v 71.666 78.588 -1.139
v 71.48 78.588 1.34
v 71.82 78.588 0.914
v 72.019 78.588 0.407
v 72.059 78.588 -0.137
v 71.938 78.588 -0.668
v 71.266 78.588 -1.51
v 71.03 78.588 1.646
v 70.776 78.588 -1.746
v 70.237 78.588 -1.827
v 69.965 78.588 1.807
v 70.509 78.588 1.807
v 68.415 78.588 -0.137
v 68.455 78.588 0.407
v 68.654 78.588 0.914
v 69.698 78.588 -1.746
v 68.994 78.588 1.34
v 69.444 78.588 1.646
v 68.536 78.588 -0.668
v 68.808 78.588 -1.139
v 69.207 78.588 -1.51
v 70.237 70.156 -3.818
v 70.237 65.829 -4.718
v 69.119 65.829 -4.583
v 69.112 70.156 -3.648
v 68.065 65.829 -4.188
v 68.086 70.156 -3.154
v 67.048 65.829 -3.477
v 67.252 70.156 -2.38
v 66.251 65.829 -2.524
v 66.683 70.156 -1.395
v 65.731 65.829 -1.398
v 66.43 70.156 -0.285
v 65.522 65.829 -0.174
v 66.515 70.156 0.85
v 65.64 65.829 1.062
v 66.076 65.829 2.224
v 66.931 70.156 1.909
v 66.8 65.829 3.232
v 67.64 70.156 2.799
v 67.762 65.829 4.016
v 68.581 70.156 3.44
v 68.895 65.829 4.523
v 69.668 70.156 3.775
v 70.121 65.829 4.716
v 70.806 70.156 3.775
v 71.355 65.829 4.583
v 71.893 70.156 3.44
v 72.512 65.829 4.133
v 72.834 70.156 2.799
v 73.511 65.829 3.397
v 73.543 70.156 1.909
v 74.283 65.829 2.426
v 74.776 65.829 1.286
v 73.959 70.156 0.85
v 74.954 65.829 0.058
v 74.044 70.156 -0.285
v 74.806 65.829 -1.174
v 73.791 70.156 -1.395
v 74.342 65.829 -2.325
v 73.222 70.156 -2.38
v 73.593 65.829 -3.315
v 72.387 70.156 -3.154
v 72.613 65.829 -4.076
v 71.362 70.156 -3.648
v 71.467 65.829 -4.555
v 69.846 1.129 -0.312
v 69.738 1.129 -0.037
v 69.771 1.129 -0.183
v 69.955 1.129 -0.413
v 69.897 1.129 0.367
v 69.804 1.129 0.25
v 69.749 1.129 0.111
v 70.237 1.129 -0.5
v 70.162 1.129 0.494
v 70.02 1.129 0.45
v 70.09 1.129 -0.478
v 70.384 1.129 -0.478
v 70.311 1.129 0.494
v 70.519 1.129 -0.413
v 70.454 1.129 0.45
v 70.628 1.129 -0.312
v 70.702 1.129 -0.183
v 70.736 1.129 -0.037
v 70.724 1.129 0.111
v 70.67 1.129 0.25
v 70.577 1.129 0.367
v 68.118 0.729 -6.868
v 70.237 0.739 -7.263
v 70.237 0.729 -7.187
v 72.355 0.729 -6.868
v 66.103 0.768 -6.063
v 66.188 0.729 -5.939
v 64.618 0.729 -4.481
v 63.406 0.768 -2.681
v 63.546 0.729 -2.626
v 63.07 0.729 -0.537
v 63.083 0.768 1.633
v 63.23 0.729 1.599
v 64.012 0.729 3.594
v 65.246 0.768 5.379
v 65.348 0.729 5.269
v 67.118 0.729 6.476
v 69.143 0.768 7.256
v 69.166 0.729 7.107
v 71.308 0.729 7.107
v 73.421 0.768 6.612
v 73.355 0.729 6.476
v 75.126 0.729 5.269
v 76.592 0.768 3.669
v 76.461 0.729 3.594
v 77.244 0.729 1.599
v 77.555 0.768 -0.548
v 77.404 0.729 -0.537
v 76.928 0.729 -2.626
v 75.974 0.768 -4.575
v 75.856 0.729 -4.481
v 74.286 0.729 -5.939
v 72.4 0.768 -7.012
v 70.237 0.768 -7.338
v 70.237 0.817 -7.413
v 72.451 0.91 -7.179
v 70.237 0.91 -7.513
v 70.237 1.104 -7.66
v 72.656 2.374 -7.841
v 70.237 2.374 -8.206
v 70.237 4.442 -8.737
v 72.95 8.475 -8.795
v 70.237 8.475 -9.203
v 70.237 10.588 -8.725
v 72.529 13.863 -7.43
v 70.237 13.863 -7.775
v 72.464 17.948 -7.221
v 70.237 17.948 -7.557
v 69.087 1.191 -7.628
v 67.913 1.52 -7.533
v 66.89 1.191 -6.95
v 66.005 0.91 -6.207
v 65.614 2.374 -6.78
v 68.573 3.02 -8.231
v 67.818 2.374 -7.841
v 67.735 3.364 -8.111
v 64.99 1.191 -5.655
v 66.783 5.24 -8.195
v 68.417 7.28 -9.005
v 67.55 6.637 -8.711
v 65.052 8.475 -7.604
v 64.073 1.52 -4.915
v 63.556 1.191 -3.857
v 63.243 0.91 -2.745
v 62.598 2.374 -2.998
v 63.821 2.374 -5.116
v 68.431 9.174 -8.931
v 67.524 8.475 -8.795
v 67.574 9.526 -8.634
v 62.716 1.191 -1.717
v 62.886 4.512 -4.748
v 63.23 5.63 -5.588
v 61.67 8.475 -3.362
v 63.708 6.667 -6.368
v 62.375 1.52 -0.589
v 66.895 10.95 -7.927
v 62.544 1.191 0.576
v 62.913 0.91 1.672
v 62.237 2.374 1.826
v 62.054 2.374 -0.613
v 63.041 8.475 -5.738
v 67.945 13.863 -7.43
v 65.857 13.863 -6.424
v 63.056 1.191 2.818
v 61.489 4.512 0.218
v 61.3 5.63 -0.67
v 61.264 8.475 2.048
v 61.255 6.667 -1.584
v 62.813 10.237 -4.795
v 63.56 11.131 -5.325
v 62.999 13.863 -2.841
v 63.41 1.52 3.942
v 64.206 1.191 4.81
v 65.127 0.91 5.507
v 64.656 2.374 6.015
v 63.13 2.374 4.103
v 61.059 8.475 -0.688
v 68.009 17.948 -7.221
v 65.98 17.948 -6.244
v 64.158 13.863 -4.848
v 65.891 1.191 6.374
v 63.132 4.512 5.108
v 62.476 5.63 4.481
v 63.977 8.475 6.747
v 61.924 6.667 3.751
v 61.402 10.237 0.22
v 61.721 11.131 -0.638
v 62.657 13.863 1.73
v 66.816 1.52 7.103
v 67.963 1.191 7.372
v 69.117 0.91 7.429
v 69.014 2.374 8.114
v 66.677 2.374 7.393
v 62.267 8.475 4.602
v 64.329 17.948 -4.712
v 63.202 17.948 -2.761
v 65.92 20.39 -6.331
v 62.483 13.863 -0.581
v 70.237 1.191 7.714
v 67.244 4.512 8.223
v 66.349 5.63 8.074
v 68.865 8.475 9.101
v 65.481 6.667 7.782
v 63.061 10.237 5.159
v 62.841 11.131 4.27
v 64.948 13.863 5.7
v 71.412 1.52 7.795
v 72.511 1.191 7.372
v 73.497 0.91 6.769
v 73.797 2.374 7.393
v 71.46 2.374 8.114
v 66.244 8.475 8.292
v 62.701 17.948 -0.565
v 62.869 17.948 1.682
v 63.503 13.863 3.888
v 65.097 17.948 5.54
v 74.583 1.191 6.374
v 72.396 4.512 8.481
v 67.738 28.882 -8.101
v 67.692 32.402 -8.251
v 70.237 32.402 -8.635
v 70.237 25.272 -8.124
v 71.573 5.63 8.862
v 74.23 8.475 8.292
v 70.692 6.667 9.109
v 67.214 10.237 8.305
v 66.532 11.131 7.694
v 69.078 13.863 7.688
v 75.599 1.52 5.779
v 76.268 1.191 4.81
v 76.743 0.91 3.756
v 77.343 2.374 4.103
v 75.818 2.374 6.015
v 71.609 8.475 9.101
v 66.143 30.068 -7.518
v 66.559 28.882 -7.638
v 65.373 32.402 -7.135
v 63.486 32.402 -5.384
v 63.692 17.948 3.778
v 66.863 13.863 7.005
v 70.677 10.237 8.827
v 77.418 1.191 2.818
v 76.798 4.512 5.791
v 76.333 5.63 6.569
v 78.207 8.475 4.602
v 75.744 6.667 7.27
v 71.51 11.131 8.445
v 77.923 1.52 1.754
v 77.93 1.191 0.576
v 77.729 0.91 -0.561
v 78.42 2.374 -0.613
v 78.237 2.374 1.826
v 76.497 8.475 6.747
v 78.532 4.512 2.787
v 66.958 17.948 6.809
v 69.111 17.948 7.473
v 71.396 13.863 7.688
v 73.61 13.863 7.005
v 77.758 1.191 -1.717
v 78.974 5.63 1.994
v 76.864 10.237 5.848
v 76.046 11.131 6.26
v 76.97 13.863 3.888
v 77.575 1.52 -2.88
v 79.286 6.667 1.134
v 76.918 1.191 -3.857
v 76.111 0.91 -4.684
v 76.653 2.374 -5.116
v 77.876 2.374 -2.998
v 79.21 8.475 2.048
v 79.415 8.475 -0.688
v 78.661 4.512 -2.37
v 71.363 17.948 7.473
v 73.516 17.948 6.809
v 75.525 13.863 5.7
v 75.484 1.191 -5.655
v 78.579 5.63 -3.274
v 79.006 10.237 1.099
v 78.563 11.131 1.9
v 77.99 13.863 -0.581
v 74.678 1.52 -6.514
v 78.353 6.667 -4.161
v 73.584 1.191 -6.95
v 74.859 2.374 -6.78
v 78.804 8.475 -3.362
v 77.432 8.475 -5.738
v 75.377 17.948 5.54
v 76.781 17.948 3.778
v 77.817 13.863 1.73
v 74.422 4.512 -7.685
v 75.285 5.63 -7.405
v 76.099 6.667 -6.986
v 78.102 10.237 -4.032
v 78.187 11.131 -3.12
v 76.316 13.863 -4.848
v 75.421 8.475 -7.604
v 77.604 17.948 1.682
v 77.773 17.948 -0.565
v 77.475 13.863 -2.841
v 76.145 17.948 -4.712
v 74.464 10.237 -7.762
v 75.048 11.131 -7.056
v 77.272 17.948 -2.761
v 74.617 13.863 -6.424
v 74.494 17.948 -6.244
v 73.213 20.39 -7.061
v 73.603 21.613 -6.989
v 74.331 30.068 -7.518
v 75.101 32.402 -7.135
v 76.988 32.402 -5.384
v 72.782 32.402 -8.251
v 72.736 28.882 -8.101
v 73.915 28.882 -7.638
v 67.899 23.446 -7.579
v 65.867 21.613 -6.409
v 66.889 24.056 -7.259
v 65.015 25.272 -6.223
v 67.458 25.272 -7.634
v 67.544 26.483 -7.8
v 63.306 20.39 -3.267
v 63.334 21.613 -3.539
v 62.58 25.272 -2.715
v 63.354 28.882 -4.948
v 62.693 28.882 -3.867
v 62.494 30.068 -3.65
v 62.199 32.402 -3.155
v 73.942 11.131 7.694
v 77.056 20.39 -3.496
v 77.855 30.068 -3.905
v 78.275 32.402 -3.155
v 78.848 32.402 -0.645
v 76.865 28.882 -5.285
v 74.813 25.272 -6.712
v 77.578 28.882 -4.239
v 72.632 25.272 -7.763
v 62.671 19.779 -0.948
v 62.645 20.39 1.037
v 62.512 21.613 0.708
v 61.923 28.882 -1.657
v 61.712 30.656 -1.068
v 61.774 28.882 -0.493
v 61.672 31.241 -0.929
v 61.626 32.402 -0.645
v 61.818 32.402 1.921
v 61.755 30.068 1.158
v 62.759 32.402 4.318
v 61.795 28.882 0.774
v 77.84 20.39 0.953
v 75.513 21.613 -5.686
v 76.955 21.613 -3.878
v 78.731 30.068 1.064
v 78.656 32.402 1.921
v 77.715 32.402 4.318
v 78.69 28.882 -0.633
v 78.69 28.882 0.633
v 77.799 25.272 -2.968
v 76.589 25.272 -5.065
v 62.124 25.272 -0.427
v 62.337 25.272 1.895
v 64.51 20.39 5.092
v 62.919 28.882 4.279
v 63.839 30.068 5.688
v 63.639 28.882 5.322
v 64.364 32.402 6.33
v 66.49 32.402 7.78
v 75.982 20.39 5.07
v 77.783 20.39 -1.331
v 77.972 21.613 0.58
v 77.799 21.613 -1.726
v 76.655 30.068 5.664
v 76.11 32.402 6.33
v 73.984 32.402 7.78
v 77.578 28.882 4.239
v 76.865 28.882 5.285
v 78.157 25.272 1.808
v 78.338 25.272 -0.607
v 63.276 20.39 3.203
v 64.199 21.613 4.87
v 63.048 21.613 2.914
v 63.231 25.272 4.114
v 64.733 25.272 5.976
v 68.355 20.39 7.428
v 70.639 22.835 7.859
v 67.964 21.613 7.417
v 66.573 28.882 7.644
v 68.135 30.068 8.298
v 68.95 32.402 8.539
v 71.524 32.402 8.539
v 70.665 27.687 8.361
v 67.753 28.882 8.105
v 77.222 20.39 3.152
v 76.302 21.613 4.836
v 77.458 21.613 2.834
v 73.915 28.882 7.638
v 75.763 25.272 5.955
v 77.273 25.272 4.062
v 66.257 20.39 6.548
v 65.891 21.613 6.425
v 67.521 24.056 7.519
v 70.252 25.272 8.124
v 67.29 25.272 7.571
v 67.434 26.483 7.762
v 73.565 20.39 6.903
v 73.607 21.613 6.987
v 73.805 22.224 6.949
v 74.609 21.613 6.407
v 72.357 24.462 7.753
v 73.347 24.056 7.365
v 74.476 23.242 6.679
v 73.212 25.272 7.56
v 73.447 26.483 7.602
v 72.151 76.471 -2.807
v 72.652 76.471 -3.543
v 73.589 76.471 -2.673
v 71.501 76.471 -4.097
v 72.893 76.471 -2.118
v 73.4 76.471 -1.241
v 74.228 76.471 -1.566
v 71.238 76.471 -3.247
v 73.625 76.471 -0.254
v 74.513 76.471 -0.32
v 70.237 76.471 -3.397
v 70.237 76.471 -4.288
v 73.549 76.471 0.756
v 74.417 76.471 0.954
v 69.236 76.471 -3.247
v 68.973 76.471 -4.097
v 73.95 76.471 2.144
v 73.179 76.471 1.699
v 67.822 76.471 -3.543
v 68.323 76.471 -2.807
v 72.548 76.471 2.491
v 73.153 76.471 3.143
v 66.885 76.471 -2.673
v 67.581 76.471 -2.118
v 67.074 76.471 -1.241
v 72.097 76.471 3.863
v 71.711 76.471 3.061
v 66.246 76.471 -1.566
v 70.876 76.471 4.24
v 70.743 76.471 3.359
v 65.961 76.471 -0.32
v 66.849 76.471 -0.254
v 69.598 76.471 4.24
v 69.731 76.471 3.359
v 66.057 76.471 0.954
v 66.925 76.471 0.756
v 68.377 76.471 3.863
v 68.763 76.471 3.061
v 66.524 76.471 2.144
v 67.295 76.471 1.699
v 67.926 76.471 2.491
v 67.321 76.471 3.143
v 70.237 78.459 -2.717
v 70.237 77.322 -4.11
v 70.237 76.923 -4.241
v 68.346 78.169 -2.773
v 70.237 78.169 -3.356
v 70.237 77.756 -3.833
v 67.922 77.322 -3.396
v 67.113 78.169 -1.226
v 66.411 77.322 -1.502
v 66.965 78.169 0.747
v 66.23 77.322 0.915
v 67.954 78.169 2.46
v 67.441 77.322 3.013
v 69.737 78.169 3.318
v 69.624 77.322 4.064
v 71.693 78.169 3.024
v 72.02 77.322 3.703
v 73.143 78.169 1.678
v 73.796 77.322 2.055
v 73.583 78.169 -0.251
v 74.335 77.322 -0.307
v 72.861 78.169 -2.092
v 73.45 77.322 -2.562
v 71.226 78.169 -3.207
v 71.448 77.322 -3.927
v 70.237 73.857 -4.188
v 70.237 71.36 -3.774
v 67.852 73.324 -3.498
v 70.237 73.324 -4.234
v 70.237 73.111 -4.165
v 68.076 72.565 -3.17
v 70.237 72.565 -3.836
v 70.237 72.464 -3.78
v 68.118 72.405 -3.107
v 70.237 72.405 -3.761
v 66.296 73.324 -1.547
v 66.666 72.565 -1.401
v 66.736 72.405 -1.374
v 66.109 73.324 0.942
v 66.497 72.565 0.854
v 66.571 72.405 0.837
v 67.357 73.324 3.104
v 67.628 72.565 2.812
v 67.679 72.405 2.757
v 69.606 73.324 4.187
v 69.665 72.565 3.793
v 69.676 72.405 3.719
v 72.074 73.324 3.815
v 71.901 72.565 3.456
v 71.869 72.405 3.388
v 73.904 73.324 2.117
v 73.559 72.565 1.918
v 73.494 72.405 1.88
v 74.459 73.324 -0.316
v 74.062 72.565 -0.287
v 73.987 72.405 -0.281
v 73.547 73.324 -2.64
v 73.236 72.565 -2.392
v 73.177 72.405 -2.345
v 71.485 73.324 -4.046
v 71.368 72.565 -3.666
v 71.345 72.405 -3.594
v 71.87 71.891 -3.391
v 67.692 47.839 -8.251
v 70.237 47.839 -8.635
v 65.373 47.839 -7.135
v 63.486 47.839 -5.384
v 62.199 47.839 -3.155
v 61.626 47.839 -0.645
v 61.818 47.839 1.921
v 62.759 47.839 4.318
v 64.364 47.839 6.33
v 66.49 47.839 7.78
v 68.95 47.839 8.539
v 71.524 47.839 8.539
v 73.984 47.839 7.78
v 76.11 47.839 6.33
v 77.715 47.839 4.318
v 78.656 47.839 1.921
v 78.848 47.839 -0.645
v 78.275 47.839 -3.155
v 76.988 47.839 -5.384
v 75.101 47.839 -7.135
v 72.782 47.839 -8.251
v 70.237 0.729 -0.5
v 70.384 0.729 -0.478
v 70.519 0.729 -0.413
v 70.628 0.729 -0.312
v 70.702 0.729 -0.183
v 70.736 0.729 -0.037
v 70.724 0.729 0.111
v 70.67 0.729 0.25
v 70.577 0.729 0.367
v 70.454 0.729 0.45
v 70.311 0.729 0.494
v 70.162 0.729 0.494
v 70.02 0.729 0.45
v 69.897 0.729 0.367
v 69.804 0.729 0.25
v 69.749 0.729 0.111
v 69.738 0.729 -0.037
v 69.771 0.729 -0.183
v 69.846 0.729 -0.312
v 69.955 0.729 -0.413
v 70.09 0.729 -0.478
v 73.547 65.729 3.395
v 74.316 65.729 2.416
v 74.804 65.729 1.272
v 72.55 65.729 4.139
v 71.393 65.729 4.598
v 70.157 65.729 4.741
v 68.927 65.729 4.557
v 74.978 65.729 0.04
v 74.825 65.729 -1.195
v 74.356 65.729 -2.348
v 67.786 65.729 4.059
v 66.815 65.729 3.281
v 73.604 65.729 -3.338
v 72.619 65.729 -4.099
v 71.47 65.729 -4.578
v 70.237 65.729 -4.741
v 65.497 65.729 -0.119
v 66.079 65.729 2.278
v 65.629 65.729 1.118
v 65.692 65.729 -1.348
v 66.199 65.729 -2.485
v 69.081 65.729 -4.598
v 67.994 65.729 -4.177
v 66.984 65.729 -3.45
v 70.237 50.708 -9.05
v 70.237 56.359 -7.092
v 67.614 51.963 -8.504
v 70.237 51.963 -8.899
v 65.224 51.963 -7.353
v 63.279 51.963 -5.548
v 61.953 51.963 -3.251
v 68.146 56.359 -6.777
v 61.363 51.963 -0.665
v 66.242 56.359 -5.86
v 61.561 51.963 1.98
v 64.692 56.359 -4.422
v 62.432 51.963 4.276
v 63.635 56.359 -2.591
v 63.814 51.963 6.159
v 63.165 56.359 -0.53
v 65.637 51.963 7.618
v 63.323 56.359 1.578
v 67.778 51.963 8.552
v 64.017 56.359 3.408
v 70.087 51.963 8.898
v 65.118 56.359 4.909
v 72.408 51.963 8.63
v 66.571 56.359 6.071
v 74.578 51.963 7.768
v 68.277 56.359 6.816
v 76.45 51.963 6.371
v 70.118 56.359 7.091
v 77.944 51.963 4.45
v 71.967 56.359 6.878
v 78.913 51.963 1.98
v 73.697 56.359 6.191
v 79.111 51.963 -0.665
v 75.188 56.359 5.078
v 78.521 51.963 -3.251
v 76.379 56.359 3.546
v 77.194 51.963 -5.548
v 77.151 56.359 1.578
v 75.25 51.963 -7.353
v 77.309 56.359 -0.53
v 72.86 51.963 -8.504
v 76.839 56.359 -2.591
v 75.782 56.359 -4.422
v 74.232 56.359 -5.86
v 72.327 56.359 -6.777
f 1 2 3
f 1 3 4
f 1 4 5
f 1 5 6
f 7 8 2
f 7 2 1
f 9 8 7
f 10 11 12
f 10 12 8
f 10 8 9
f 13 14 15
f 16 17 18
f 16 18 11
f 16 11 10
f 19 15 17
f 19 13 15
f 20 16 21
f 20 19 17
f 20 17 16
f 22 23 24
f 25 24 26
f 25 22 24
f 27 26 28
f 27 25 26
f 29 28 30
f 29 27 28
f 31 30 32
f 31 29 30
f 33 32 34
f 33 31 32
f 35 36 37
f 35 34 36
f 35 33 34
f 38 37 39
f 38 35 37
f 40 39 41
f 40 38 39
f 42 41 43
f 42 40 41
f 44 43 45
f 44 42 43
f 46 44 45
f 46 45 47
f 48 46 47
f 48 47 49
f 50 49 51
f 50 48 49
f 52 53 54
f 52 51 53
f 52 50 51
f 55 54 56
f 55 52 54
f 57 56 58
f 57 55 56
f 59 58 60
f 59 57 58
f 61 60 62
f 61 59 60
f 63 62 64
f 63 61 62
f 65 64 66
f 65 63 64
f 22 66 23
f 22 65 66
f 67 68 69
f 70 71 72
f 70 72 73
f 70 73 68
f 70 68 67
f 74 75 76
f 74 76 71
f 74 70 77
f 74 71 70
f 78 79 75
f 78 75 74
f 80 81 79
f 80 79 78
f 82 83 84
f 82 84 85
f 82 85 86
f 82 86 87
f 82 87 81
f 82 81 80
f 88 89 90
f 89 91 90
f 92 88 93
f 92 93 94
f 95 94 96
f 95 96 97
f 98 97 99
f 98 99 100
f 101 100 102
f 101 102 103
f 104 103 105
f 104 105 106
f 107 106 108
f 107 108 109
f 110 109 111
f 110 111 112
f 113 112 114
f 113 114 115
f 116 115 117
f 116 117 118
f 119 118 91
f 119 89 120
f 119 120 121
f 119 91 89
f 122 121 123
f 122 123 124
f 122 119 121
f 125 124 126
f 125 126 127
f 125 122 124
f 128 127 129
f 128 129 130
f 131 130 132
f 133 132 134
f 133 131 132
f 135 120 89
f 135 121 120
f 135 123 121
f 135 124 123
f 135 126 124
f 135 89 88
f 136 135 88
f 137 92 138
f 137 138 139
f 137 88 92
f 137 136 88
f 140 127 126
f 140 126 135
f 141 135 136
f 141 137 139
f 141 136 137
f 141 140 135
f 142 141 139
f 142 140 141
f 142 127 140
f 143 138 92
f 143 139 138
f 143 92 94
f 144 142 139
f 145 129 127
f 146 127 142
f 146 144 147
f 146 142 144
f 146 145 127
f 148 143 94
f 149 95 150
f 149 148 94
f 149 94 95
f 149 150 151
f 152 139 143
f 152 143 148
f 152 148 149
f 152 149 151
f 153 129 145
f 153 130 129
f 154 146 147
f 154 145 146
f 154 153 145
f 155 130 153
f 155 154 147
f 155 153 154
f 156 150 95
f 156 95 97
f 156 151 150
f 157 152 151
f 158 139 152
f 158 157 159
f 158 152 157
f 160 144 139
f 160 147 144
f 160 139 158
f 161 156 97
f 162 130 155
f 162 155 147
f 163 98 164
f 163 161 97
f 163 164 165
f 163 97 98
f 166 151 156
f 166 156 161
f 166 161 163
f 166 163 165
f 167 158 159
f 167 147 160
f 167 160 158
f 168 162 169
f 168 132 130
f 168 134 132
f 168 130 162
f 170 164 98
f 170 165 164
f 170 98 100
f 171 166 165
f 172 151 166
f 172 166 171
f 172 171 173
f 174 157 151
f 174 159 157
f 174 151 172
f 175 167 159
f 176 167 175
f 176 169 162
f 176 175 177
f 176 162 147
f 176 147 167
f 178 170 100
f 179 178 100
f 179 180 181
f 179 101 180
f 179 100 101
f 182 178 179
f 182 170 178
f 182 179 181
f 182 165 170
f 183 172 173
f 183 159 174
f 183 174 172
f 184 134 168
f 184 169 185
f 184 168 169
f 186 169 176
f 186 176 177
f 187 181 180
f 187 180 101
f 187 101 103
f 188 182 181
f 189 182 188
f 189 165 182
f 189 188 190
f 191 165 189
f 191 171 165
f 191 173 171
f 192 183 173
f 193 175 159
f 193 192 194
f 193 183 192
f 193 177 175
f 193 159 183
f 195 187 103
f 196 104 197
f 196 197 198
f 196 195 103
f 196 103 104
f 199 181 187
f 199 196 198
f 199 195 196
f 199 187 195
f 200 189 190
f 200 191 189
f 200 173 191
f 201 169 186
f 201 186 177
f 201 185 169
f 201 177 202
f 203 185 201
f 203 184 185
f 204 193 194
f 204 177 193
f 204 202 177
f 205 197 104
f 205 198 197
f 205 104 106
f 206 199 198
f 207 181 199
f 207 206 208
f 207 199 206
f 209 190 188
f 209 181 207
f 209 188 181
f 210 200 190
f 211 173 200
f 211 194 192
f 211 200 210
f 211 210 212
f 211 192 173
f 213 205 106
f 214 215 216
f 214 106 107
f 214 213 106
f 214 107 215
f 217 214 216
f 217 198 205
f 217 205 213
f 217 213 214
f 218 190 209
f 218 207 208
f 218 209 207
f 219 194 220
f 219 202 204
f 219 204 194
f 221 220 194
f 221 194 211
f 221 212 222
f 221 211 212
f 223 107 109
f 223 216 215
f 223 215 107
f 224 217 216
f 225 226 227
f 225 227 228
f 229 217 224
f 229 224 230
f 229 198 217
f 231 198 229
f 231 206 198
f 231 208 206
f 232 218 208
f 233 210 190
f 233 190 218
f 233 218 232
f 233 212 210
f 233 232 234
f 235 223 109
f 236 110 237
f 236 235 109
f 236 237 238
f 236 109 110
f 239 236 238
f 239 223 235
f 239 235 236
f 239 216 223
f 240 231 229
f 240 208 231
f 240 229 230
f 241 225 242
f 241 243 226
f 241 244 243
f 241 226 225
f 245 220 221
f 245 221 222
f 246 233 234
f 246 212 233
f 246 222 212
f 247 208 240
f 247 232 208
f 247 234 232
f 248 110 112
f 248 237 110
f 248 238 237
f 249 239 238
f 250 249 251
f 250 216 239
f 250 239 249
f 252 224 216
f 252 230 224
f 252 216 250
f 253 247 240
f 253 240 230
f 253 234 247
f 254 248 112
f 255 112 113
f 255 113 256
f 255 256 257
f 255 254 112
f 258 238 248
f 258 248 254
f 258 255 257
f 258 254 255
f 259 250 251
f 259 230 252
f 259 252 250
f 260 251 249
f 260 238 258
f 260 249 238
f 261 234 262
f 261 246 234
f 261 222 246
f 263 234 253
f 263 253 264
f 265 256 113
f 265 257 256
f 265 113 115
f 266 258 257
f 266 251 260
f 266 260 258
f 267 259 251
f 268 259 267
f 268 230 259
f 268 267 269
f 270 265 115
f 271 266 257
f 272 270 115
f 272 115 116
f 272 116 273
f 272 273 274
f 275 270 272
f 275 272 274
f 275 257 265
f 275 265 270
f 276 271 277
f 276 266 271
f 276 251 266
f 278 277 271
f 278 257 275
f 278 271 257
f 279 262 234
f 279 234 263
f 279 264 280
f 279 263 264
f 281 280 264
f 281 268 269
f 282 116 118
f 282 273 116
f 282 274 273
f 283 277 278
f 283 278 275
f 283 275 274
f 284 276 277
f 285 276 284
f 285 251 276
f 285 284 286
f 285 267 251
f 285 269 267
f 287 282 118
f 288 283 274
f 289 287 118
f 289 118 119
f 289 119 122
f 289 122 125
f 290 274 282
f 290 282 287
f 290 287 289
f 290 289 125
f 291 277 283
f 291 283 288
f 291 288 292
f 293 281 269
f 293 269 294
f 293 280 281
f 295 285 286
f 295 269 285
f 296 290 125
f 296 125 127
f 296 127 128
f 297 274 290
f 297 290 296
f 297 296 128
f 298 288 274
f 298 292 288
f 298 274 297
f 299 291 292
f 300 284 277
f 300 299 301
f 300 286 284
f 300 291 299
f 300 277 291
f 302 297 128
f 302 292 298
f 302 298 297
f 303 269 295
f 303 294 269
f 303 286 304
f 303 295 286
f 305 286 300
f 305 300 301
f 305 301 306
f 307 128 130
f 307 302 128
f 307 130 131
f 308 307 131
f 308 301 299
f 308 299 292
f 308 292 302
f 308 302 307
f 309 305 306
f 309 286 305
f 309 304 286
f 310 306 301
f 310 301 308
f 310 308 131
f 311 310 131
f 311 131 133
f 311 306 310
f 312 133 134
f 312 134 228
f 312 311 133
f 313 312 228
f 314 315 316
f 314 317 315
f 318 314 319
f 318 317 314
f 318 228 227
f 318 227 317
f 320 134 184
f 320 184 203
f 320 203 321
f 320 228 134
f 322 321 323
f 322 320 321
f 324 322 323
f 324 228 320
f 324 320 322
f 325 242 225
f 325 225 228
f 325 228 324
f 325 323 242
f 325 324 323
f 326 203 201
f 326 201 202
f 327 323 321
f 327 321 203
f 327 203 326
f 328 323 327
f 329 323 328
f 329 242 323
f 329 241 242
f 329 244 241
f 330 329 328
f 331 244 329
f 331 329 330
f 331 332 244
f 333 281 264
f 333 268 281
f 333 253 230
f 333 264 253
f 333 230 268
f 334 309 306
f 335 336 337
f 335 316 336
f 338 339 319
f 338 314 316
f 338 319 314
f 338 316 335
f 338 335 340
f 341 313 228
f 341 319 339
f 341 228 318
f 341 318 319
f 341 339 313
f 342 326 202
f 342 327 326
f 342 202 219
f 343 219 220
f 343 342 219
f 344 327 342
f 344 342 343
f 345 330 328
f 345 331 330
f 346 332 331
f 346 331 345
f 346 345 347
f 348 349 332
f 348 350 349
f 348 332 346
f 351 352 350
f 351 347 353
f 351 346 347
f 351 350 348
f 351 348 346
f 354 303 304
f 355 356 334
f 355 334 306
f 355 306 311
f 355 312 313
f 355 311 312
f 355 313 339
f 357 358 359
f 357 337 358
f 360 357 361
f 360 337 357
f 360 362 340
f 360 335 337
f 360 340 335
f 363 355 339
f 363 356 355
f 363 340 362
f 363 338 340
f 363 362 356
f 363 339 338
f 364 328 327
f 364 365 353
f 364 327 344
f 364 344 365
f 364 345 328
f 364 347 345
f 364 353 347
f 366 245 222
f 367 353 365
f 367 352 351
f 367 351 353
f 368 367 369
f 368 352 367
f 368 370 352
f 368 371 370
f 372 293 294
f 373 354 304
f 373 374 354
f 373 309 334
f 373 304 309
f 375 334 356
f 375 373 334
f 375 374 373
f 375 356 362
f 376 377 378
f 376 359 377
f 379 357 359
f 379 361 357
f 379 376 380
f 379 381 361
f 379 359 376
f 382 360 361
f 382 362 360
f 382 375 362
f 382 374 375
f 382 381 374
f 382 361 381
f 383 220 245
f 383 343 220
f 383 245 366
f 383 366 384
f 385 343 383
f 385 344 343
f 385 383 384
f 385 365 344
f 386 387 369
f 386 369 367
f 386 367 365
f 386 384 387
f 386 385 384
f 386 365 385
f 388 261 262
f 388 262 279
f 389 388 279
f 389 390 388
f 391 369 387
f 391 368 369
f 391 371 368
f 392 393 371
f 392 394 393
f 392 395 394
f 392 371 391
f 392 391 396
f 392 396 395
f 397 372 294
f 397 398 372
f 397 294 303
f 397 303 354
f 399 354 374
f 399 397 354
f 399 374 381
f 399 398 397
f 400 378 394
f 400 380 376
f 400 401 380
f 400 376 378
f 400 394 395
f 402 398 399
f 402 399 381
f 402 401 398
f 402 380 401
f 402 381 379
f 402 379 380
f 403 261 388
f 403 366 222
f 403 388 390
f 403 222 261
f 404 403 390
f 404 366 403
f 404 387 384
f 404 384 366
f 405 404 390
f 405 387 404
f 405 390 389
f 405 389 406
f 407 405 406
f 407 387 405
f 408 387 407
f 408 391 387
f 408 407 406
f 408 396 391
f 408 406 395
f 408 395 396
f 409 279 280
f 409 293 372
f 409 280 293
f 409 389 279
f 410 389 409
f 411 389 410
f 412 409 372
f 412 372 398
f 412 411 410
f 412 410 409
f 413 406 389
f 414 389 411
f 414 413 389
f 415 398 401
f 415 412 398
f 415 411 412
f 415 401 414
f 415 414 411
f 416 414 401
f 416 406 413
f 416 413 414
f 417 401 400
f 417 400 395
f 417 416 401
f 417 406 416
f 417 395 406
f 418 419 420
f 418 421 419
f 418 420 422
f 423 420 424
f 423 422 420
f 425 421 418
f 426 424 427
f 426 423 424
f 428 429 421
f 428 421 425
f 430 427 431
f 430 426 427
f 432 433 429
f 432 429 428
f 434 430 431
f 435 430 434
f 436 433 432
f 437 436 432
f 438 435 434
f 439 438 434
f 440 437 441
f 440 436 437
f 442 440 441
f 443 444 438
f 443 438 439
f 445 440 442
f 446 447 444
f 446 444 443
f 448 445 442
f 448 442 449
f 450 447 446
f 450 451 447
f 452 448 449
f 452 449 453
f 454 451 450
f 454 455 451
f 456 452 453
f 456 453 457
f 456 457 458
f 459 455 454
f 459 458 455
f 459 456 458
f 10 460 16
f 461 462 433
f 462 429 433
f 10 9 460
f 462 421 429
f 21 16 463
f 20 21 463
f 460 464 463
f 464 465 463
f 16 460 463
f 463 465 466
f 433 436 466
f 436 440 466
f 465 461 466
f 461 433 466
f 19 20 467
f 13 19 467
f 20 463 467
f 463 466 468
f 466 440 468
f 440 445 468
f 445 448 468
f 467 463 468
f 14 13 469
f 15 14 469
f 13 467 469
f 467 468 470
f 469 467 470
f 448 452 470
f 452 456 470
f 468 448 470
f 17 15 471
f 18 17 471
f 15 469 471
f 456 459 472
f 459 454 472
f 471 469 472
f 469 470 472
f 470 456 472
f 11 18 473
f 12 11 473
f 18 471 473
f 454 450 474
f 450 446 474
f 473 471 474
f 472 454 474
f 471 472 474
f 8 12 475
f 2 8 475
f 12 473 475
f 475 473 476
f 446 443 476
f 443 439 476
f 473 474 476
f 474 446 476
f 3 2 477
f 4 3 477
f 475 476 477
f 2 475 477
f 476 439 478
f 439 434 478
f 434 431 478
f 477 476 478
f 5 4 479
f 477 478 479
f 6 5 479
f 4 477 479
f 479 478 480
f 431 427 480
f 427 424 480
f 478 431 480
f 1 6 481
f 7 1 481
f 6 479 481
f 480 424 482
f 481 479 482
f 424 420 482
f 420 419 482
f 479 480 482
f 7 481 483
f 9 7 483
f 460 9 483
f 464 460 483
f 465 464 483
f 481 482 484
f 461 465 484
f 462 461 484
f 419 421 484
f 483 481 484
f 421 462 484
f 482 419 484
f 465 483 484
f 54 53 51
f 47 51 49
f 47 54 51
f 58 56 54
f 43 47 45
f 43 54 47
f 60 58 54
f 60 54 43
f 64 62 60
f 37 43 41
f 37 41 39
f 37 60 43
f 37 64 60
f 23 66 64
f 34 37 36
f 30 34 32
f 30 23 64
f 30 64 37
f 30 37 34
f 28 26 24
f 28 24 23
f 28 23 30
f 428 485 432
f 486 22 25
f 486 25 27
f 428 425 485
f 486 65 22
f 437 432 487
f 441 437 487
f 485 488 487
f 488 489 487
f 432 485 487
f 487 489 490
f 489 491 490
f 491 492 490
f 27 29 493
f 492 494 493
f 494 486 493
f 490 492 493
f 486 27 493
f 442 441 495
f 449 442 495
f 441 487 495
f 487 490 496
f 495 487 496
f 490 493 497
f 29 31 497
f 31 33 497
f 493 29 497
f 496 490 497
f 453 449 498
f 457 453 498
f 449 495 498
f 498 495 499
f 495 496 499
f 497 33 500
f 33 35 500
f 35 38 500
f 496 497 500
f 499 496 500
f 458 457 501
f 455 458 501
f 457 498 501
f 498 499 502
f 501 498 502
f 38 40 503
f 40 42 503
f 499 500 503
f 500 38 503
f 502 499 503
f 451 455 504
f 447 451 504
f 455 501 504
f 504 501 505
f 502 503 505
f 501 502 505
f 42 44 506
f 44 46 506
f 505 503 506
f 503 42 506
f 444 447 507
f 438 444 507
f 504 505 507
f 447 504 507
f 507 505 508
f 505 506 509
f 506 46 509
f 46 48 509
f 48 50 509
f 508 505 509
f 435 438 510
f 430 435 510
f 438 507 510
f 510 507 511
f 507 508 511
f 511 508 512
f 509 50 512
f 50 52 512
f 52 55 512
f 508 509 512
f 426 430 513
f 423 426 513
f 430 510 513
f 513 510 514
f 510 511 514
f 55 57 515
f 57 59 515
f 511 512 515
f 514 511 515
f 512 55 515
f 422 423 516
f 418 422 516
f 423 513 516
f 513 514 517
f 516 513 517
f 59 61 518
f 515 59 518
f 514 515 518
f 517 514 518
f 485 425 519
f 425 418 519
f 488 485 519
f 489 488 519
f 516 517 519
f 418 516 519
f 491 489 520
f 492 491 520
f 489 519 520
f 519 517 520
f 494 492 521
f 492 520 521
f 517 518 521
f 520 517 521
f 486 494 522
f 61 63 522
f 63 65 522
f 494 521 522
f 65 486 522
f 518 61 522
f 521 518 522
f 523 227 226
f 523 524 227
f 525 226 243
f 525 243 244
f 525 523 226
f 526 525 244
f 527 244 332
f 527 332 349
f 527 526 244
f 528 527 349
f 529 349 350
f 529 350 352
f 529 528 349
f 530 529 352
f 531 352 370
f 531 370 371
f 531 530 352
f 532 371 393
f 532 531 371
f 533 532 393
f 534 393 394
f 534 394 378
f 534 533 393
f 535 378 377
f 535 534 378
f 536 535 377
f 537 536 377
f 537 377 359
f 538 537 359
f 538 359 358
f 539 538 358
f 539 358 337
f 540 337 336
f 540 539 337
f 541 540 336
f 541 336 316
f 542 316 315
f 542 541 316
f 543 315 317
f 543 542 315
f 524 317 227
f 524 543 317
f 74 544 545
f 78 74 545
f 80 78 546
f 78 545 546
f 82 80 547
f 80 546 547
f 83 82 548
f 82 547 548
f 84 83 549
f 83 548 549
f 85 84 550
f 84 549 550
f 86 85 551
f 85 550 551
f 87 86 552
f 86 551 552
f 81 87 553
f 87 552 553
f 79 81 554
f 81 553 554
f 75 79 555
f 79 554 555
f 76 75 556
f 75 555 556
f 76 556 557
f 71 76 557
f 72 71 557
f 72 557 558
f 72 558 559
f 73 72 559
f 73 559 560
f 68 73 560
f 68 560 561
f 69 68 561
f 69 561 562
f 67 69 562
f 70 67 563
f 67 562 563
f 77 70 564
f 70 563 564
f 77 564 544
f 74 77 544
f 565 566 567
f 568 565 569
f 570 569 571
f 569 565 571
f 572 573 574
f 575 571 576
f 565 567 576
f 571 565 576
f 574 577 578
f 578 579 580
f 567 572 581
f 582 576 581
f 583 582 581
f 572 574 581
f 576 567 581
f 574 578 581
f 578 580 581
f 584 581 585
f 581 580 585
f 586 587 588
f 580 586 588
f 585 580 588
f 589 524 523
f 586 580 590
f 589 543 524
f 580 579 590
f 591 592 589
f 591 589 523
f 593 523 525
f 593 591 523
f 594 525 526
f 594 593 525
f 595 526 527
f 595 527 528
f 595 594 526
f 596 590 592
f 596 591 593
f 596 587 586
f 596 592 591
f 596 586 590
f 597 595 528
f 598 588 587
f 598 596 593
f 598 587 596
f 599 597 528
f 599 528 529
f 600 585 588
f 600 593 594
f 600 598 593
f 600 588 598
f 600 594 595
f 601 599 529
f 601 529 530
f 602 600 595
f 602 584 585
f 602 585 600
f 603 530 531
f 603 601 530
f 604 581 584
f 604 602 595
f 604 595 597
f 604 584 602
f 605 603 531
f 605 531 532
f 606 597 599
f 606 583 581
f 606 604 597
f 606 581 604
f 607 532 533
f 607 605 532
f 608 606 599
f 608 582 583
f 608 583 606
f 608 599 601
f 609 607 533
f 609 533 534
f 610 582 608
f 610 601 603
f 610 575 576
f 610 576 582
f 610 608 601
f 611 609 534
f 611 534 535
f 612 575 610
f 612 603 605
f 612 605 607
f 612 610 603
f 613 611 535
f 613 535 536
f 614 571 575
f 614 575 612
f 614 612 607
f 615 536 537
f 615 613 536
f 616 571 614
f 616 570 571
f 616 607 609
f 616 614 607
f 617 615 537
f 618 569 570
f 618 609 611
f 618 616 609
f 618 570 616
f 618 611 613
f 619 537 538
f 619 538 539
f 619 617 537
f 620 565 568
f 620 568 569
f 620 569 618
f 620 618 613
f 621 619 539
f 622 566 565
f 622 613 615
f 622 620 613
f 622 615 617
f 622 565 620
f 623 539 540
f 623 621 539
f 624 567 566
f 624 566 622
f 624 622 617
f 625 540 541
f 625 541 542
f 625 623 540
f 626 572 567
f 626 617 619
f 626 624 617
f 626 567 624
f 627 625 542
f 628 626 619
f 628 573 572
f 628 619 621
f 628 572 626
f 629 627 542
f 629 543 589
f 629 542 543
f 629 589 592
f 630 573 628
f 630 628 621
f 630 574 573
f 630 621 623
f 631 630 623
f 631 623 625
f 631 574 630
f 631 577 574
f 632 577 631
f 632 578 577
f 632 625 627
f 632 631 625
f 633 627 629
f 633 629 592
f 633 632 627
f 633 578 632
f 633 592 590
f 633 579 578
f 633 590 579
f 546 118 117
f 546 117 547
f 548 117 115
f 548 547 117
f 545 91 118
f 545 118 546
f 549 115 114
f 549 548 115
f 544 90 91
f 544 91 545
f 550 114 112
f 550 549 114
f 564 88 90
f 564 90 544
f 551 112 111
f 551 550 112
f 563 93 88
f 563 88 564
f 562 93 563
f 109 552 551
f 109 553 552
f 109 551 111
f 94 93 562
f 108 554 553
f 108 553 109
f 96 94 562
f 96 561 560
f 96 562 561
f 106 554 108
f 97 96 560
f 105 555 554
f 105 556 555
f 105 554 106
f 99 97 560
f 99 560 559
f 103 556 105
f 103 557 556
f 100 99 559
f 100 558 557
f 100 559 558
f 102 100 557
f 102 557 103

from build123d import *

# Parameters (mm, degrees)
ESBO_O4_R             = 12.021384461
CORTE_EXTRUS_O1_DEPTH = 0.1
ESBO_O5_R             = 0.5
CORTE_EXTRUS_O2_DEPTH = 0.4


with BuildPart() as part:
    # Esboço3 → Revolução1 (revolve)
    with BuildSketch(Plane.XY, mode=Mode.PRIVATE) as revolu_o1_sk:
        with BuildLine():
            Line((61.601817141, 32.402072085), (61.601817141, 47.838555424))
            add(Edge.make_bspline(
                [(61.601817141, 47.838555424), (61.601817141, 48.156811584), (60.859856314, 50.821300378), (61.77285658, 53.240312178), (62.783477222, 55.089658209), (63.874248839, 58.885612566), (66.369269293, 69.122641766), (66.419280732, 70.15583146)],
                knots=[0, 0, 0, 0, 0.186929837, 0.313357562, 0.493595799, 0.562260043, 1, 1, 1, 1], degree=3))
            add(Edge.make_bspline(
                [(66.476371283, 72.402019137), (66.476371283, 71.698138184), (66.457177975, 70.938753163), (66.419280732, 70.15583146)],
                knots=[0, 0, 0, 0, 0.075054494, 0.075054494, 0.075054494, 0.075054494], degree=3))
            add(Edge.make_bspline(
                [(65.999647343, 73.37030672), (65.999647343, 73.059092303), (66.476371283, 72.529263326), (66.476371283, 72.402019137)],
                knots=[0, 0, 0, 0, 1, 1, 1, 1], degree=3))
            add(Edge.make_bspline(
                [(65.999647343, 73.37030672), (65.999647343, 74.197074379), (66.839482035, 76.471404644)],
                knots=[0, 0, 0, 1, 1, 1], degree=2))
            Line((66.839482035, 76.471404644), (65.949262934, 76.471404644))
            add(Edge.make_bspline(
                [(68.409468023, 78.588337077), (67.155283918, 78.588337077), (65.949262934, 77.851984406), (65.949262934, 76.471404644)],
                knots=[0, 0, 0, 0, 1, 1, 1, 1], degree=3))
            Line((68.409468023, 78.588337077), (70.2369282, 78.588337077))
            Line((70.2369282, 78.588337077), (70.2369282, 0.72855248))
            Line((70.2369282, 0.72855248), (63.049496982, 0.72855248))
            add(Edge.make_bspline(
                [(63.049496982, 0.72855248), (62.280465322, 0.72855248), (61.19488738, 5.349373028), (60.838200592, 9.371029922), (62.333477371, 12.388067865), (63.179698711, 20.248645789), (61.601817141, 26.983300513), (61.601817141, 32.402072085)],
                knots=[0, 0, 0, 0, 0.184554254, 0.267801276, 0.401843949, 0.47532179, 1, 1, 1, 1], degree=3))
        make_face()
    revolve(revolu_o1_sk.sketch.rotate(Axis((70.2369282, 0.72855248, 0), (0, 1, 0)), 270), axis=Axis((70.2369282, 0.72855248, 0), (0, 1, 0)))

    # Esboço4 → Corte-extrusão1 (cut)
    with BuildSketch(Plane(origin=(0, 65.72855248, 0), x_dir=(-1, 0, 0), z_dir=(0, -1, 0))):
        with Locations((-70.2369282, 0)):
            Circle(ESBO_O4_R)
    extrude(amount=-CORTE_EXTRUS_O1_DEPTH, mode=Mode.SUBTRACT)


with BuildPart() as corte_extrus_o1_piece_1:
    # of the separate pieces the step leaves, piece 1, a body of its own (corte_extrus_o1_pieces)
    add(part.part.solids().sort_by_distance((70.2369282, 32.402072085, -8.63511106))[0])

    # Esboço5 → Corte-extrusão2 (cut)
    with BuildSketch(Plane.XZ.offset(-0.72855248)):
        with Locations(Location((70.2369282, 0, 0), (0, 0, 270))):
            Circle(ESBO_O5_R)
    extrude(amount=-CORTE_EXTRUS_O2_DEPTH, mode=Mode.SUBTRACT)


with BuildPart() as corte_extrus_o1_piece_2:
    # of the separate pieces the step leaves, piece 2, a body of its own (corte_extrus_o1_pieces)
    add(part.part.solids().sort_by_distance((70.2369282, 65.82855248, -4.717862276))[0])


solid = Compound([corte_extrus_o1_piece_1.part, corte_extrus_o1_piece_2.part])
